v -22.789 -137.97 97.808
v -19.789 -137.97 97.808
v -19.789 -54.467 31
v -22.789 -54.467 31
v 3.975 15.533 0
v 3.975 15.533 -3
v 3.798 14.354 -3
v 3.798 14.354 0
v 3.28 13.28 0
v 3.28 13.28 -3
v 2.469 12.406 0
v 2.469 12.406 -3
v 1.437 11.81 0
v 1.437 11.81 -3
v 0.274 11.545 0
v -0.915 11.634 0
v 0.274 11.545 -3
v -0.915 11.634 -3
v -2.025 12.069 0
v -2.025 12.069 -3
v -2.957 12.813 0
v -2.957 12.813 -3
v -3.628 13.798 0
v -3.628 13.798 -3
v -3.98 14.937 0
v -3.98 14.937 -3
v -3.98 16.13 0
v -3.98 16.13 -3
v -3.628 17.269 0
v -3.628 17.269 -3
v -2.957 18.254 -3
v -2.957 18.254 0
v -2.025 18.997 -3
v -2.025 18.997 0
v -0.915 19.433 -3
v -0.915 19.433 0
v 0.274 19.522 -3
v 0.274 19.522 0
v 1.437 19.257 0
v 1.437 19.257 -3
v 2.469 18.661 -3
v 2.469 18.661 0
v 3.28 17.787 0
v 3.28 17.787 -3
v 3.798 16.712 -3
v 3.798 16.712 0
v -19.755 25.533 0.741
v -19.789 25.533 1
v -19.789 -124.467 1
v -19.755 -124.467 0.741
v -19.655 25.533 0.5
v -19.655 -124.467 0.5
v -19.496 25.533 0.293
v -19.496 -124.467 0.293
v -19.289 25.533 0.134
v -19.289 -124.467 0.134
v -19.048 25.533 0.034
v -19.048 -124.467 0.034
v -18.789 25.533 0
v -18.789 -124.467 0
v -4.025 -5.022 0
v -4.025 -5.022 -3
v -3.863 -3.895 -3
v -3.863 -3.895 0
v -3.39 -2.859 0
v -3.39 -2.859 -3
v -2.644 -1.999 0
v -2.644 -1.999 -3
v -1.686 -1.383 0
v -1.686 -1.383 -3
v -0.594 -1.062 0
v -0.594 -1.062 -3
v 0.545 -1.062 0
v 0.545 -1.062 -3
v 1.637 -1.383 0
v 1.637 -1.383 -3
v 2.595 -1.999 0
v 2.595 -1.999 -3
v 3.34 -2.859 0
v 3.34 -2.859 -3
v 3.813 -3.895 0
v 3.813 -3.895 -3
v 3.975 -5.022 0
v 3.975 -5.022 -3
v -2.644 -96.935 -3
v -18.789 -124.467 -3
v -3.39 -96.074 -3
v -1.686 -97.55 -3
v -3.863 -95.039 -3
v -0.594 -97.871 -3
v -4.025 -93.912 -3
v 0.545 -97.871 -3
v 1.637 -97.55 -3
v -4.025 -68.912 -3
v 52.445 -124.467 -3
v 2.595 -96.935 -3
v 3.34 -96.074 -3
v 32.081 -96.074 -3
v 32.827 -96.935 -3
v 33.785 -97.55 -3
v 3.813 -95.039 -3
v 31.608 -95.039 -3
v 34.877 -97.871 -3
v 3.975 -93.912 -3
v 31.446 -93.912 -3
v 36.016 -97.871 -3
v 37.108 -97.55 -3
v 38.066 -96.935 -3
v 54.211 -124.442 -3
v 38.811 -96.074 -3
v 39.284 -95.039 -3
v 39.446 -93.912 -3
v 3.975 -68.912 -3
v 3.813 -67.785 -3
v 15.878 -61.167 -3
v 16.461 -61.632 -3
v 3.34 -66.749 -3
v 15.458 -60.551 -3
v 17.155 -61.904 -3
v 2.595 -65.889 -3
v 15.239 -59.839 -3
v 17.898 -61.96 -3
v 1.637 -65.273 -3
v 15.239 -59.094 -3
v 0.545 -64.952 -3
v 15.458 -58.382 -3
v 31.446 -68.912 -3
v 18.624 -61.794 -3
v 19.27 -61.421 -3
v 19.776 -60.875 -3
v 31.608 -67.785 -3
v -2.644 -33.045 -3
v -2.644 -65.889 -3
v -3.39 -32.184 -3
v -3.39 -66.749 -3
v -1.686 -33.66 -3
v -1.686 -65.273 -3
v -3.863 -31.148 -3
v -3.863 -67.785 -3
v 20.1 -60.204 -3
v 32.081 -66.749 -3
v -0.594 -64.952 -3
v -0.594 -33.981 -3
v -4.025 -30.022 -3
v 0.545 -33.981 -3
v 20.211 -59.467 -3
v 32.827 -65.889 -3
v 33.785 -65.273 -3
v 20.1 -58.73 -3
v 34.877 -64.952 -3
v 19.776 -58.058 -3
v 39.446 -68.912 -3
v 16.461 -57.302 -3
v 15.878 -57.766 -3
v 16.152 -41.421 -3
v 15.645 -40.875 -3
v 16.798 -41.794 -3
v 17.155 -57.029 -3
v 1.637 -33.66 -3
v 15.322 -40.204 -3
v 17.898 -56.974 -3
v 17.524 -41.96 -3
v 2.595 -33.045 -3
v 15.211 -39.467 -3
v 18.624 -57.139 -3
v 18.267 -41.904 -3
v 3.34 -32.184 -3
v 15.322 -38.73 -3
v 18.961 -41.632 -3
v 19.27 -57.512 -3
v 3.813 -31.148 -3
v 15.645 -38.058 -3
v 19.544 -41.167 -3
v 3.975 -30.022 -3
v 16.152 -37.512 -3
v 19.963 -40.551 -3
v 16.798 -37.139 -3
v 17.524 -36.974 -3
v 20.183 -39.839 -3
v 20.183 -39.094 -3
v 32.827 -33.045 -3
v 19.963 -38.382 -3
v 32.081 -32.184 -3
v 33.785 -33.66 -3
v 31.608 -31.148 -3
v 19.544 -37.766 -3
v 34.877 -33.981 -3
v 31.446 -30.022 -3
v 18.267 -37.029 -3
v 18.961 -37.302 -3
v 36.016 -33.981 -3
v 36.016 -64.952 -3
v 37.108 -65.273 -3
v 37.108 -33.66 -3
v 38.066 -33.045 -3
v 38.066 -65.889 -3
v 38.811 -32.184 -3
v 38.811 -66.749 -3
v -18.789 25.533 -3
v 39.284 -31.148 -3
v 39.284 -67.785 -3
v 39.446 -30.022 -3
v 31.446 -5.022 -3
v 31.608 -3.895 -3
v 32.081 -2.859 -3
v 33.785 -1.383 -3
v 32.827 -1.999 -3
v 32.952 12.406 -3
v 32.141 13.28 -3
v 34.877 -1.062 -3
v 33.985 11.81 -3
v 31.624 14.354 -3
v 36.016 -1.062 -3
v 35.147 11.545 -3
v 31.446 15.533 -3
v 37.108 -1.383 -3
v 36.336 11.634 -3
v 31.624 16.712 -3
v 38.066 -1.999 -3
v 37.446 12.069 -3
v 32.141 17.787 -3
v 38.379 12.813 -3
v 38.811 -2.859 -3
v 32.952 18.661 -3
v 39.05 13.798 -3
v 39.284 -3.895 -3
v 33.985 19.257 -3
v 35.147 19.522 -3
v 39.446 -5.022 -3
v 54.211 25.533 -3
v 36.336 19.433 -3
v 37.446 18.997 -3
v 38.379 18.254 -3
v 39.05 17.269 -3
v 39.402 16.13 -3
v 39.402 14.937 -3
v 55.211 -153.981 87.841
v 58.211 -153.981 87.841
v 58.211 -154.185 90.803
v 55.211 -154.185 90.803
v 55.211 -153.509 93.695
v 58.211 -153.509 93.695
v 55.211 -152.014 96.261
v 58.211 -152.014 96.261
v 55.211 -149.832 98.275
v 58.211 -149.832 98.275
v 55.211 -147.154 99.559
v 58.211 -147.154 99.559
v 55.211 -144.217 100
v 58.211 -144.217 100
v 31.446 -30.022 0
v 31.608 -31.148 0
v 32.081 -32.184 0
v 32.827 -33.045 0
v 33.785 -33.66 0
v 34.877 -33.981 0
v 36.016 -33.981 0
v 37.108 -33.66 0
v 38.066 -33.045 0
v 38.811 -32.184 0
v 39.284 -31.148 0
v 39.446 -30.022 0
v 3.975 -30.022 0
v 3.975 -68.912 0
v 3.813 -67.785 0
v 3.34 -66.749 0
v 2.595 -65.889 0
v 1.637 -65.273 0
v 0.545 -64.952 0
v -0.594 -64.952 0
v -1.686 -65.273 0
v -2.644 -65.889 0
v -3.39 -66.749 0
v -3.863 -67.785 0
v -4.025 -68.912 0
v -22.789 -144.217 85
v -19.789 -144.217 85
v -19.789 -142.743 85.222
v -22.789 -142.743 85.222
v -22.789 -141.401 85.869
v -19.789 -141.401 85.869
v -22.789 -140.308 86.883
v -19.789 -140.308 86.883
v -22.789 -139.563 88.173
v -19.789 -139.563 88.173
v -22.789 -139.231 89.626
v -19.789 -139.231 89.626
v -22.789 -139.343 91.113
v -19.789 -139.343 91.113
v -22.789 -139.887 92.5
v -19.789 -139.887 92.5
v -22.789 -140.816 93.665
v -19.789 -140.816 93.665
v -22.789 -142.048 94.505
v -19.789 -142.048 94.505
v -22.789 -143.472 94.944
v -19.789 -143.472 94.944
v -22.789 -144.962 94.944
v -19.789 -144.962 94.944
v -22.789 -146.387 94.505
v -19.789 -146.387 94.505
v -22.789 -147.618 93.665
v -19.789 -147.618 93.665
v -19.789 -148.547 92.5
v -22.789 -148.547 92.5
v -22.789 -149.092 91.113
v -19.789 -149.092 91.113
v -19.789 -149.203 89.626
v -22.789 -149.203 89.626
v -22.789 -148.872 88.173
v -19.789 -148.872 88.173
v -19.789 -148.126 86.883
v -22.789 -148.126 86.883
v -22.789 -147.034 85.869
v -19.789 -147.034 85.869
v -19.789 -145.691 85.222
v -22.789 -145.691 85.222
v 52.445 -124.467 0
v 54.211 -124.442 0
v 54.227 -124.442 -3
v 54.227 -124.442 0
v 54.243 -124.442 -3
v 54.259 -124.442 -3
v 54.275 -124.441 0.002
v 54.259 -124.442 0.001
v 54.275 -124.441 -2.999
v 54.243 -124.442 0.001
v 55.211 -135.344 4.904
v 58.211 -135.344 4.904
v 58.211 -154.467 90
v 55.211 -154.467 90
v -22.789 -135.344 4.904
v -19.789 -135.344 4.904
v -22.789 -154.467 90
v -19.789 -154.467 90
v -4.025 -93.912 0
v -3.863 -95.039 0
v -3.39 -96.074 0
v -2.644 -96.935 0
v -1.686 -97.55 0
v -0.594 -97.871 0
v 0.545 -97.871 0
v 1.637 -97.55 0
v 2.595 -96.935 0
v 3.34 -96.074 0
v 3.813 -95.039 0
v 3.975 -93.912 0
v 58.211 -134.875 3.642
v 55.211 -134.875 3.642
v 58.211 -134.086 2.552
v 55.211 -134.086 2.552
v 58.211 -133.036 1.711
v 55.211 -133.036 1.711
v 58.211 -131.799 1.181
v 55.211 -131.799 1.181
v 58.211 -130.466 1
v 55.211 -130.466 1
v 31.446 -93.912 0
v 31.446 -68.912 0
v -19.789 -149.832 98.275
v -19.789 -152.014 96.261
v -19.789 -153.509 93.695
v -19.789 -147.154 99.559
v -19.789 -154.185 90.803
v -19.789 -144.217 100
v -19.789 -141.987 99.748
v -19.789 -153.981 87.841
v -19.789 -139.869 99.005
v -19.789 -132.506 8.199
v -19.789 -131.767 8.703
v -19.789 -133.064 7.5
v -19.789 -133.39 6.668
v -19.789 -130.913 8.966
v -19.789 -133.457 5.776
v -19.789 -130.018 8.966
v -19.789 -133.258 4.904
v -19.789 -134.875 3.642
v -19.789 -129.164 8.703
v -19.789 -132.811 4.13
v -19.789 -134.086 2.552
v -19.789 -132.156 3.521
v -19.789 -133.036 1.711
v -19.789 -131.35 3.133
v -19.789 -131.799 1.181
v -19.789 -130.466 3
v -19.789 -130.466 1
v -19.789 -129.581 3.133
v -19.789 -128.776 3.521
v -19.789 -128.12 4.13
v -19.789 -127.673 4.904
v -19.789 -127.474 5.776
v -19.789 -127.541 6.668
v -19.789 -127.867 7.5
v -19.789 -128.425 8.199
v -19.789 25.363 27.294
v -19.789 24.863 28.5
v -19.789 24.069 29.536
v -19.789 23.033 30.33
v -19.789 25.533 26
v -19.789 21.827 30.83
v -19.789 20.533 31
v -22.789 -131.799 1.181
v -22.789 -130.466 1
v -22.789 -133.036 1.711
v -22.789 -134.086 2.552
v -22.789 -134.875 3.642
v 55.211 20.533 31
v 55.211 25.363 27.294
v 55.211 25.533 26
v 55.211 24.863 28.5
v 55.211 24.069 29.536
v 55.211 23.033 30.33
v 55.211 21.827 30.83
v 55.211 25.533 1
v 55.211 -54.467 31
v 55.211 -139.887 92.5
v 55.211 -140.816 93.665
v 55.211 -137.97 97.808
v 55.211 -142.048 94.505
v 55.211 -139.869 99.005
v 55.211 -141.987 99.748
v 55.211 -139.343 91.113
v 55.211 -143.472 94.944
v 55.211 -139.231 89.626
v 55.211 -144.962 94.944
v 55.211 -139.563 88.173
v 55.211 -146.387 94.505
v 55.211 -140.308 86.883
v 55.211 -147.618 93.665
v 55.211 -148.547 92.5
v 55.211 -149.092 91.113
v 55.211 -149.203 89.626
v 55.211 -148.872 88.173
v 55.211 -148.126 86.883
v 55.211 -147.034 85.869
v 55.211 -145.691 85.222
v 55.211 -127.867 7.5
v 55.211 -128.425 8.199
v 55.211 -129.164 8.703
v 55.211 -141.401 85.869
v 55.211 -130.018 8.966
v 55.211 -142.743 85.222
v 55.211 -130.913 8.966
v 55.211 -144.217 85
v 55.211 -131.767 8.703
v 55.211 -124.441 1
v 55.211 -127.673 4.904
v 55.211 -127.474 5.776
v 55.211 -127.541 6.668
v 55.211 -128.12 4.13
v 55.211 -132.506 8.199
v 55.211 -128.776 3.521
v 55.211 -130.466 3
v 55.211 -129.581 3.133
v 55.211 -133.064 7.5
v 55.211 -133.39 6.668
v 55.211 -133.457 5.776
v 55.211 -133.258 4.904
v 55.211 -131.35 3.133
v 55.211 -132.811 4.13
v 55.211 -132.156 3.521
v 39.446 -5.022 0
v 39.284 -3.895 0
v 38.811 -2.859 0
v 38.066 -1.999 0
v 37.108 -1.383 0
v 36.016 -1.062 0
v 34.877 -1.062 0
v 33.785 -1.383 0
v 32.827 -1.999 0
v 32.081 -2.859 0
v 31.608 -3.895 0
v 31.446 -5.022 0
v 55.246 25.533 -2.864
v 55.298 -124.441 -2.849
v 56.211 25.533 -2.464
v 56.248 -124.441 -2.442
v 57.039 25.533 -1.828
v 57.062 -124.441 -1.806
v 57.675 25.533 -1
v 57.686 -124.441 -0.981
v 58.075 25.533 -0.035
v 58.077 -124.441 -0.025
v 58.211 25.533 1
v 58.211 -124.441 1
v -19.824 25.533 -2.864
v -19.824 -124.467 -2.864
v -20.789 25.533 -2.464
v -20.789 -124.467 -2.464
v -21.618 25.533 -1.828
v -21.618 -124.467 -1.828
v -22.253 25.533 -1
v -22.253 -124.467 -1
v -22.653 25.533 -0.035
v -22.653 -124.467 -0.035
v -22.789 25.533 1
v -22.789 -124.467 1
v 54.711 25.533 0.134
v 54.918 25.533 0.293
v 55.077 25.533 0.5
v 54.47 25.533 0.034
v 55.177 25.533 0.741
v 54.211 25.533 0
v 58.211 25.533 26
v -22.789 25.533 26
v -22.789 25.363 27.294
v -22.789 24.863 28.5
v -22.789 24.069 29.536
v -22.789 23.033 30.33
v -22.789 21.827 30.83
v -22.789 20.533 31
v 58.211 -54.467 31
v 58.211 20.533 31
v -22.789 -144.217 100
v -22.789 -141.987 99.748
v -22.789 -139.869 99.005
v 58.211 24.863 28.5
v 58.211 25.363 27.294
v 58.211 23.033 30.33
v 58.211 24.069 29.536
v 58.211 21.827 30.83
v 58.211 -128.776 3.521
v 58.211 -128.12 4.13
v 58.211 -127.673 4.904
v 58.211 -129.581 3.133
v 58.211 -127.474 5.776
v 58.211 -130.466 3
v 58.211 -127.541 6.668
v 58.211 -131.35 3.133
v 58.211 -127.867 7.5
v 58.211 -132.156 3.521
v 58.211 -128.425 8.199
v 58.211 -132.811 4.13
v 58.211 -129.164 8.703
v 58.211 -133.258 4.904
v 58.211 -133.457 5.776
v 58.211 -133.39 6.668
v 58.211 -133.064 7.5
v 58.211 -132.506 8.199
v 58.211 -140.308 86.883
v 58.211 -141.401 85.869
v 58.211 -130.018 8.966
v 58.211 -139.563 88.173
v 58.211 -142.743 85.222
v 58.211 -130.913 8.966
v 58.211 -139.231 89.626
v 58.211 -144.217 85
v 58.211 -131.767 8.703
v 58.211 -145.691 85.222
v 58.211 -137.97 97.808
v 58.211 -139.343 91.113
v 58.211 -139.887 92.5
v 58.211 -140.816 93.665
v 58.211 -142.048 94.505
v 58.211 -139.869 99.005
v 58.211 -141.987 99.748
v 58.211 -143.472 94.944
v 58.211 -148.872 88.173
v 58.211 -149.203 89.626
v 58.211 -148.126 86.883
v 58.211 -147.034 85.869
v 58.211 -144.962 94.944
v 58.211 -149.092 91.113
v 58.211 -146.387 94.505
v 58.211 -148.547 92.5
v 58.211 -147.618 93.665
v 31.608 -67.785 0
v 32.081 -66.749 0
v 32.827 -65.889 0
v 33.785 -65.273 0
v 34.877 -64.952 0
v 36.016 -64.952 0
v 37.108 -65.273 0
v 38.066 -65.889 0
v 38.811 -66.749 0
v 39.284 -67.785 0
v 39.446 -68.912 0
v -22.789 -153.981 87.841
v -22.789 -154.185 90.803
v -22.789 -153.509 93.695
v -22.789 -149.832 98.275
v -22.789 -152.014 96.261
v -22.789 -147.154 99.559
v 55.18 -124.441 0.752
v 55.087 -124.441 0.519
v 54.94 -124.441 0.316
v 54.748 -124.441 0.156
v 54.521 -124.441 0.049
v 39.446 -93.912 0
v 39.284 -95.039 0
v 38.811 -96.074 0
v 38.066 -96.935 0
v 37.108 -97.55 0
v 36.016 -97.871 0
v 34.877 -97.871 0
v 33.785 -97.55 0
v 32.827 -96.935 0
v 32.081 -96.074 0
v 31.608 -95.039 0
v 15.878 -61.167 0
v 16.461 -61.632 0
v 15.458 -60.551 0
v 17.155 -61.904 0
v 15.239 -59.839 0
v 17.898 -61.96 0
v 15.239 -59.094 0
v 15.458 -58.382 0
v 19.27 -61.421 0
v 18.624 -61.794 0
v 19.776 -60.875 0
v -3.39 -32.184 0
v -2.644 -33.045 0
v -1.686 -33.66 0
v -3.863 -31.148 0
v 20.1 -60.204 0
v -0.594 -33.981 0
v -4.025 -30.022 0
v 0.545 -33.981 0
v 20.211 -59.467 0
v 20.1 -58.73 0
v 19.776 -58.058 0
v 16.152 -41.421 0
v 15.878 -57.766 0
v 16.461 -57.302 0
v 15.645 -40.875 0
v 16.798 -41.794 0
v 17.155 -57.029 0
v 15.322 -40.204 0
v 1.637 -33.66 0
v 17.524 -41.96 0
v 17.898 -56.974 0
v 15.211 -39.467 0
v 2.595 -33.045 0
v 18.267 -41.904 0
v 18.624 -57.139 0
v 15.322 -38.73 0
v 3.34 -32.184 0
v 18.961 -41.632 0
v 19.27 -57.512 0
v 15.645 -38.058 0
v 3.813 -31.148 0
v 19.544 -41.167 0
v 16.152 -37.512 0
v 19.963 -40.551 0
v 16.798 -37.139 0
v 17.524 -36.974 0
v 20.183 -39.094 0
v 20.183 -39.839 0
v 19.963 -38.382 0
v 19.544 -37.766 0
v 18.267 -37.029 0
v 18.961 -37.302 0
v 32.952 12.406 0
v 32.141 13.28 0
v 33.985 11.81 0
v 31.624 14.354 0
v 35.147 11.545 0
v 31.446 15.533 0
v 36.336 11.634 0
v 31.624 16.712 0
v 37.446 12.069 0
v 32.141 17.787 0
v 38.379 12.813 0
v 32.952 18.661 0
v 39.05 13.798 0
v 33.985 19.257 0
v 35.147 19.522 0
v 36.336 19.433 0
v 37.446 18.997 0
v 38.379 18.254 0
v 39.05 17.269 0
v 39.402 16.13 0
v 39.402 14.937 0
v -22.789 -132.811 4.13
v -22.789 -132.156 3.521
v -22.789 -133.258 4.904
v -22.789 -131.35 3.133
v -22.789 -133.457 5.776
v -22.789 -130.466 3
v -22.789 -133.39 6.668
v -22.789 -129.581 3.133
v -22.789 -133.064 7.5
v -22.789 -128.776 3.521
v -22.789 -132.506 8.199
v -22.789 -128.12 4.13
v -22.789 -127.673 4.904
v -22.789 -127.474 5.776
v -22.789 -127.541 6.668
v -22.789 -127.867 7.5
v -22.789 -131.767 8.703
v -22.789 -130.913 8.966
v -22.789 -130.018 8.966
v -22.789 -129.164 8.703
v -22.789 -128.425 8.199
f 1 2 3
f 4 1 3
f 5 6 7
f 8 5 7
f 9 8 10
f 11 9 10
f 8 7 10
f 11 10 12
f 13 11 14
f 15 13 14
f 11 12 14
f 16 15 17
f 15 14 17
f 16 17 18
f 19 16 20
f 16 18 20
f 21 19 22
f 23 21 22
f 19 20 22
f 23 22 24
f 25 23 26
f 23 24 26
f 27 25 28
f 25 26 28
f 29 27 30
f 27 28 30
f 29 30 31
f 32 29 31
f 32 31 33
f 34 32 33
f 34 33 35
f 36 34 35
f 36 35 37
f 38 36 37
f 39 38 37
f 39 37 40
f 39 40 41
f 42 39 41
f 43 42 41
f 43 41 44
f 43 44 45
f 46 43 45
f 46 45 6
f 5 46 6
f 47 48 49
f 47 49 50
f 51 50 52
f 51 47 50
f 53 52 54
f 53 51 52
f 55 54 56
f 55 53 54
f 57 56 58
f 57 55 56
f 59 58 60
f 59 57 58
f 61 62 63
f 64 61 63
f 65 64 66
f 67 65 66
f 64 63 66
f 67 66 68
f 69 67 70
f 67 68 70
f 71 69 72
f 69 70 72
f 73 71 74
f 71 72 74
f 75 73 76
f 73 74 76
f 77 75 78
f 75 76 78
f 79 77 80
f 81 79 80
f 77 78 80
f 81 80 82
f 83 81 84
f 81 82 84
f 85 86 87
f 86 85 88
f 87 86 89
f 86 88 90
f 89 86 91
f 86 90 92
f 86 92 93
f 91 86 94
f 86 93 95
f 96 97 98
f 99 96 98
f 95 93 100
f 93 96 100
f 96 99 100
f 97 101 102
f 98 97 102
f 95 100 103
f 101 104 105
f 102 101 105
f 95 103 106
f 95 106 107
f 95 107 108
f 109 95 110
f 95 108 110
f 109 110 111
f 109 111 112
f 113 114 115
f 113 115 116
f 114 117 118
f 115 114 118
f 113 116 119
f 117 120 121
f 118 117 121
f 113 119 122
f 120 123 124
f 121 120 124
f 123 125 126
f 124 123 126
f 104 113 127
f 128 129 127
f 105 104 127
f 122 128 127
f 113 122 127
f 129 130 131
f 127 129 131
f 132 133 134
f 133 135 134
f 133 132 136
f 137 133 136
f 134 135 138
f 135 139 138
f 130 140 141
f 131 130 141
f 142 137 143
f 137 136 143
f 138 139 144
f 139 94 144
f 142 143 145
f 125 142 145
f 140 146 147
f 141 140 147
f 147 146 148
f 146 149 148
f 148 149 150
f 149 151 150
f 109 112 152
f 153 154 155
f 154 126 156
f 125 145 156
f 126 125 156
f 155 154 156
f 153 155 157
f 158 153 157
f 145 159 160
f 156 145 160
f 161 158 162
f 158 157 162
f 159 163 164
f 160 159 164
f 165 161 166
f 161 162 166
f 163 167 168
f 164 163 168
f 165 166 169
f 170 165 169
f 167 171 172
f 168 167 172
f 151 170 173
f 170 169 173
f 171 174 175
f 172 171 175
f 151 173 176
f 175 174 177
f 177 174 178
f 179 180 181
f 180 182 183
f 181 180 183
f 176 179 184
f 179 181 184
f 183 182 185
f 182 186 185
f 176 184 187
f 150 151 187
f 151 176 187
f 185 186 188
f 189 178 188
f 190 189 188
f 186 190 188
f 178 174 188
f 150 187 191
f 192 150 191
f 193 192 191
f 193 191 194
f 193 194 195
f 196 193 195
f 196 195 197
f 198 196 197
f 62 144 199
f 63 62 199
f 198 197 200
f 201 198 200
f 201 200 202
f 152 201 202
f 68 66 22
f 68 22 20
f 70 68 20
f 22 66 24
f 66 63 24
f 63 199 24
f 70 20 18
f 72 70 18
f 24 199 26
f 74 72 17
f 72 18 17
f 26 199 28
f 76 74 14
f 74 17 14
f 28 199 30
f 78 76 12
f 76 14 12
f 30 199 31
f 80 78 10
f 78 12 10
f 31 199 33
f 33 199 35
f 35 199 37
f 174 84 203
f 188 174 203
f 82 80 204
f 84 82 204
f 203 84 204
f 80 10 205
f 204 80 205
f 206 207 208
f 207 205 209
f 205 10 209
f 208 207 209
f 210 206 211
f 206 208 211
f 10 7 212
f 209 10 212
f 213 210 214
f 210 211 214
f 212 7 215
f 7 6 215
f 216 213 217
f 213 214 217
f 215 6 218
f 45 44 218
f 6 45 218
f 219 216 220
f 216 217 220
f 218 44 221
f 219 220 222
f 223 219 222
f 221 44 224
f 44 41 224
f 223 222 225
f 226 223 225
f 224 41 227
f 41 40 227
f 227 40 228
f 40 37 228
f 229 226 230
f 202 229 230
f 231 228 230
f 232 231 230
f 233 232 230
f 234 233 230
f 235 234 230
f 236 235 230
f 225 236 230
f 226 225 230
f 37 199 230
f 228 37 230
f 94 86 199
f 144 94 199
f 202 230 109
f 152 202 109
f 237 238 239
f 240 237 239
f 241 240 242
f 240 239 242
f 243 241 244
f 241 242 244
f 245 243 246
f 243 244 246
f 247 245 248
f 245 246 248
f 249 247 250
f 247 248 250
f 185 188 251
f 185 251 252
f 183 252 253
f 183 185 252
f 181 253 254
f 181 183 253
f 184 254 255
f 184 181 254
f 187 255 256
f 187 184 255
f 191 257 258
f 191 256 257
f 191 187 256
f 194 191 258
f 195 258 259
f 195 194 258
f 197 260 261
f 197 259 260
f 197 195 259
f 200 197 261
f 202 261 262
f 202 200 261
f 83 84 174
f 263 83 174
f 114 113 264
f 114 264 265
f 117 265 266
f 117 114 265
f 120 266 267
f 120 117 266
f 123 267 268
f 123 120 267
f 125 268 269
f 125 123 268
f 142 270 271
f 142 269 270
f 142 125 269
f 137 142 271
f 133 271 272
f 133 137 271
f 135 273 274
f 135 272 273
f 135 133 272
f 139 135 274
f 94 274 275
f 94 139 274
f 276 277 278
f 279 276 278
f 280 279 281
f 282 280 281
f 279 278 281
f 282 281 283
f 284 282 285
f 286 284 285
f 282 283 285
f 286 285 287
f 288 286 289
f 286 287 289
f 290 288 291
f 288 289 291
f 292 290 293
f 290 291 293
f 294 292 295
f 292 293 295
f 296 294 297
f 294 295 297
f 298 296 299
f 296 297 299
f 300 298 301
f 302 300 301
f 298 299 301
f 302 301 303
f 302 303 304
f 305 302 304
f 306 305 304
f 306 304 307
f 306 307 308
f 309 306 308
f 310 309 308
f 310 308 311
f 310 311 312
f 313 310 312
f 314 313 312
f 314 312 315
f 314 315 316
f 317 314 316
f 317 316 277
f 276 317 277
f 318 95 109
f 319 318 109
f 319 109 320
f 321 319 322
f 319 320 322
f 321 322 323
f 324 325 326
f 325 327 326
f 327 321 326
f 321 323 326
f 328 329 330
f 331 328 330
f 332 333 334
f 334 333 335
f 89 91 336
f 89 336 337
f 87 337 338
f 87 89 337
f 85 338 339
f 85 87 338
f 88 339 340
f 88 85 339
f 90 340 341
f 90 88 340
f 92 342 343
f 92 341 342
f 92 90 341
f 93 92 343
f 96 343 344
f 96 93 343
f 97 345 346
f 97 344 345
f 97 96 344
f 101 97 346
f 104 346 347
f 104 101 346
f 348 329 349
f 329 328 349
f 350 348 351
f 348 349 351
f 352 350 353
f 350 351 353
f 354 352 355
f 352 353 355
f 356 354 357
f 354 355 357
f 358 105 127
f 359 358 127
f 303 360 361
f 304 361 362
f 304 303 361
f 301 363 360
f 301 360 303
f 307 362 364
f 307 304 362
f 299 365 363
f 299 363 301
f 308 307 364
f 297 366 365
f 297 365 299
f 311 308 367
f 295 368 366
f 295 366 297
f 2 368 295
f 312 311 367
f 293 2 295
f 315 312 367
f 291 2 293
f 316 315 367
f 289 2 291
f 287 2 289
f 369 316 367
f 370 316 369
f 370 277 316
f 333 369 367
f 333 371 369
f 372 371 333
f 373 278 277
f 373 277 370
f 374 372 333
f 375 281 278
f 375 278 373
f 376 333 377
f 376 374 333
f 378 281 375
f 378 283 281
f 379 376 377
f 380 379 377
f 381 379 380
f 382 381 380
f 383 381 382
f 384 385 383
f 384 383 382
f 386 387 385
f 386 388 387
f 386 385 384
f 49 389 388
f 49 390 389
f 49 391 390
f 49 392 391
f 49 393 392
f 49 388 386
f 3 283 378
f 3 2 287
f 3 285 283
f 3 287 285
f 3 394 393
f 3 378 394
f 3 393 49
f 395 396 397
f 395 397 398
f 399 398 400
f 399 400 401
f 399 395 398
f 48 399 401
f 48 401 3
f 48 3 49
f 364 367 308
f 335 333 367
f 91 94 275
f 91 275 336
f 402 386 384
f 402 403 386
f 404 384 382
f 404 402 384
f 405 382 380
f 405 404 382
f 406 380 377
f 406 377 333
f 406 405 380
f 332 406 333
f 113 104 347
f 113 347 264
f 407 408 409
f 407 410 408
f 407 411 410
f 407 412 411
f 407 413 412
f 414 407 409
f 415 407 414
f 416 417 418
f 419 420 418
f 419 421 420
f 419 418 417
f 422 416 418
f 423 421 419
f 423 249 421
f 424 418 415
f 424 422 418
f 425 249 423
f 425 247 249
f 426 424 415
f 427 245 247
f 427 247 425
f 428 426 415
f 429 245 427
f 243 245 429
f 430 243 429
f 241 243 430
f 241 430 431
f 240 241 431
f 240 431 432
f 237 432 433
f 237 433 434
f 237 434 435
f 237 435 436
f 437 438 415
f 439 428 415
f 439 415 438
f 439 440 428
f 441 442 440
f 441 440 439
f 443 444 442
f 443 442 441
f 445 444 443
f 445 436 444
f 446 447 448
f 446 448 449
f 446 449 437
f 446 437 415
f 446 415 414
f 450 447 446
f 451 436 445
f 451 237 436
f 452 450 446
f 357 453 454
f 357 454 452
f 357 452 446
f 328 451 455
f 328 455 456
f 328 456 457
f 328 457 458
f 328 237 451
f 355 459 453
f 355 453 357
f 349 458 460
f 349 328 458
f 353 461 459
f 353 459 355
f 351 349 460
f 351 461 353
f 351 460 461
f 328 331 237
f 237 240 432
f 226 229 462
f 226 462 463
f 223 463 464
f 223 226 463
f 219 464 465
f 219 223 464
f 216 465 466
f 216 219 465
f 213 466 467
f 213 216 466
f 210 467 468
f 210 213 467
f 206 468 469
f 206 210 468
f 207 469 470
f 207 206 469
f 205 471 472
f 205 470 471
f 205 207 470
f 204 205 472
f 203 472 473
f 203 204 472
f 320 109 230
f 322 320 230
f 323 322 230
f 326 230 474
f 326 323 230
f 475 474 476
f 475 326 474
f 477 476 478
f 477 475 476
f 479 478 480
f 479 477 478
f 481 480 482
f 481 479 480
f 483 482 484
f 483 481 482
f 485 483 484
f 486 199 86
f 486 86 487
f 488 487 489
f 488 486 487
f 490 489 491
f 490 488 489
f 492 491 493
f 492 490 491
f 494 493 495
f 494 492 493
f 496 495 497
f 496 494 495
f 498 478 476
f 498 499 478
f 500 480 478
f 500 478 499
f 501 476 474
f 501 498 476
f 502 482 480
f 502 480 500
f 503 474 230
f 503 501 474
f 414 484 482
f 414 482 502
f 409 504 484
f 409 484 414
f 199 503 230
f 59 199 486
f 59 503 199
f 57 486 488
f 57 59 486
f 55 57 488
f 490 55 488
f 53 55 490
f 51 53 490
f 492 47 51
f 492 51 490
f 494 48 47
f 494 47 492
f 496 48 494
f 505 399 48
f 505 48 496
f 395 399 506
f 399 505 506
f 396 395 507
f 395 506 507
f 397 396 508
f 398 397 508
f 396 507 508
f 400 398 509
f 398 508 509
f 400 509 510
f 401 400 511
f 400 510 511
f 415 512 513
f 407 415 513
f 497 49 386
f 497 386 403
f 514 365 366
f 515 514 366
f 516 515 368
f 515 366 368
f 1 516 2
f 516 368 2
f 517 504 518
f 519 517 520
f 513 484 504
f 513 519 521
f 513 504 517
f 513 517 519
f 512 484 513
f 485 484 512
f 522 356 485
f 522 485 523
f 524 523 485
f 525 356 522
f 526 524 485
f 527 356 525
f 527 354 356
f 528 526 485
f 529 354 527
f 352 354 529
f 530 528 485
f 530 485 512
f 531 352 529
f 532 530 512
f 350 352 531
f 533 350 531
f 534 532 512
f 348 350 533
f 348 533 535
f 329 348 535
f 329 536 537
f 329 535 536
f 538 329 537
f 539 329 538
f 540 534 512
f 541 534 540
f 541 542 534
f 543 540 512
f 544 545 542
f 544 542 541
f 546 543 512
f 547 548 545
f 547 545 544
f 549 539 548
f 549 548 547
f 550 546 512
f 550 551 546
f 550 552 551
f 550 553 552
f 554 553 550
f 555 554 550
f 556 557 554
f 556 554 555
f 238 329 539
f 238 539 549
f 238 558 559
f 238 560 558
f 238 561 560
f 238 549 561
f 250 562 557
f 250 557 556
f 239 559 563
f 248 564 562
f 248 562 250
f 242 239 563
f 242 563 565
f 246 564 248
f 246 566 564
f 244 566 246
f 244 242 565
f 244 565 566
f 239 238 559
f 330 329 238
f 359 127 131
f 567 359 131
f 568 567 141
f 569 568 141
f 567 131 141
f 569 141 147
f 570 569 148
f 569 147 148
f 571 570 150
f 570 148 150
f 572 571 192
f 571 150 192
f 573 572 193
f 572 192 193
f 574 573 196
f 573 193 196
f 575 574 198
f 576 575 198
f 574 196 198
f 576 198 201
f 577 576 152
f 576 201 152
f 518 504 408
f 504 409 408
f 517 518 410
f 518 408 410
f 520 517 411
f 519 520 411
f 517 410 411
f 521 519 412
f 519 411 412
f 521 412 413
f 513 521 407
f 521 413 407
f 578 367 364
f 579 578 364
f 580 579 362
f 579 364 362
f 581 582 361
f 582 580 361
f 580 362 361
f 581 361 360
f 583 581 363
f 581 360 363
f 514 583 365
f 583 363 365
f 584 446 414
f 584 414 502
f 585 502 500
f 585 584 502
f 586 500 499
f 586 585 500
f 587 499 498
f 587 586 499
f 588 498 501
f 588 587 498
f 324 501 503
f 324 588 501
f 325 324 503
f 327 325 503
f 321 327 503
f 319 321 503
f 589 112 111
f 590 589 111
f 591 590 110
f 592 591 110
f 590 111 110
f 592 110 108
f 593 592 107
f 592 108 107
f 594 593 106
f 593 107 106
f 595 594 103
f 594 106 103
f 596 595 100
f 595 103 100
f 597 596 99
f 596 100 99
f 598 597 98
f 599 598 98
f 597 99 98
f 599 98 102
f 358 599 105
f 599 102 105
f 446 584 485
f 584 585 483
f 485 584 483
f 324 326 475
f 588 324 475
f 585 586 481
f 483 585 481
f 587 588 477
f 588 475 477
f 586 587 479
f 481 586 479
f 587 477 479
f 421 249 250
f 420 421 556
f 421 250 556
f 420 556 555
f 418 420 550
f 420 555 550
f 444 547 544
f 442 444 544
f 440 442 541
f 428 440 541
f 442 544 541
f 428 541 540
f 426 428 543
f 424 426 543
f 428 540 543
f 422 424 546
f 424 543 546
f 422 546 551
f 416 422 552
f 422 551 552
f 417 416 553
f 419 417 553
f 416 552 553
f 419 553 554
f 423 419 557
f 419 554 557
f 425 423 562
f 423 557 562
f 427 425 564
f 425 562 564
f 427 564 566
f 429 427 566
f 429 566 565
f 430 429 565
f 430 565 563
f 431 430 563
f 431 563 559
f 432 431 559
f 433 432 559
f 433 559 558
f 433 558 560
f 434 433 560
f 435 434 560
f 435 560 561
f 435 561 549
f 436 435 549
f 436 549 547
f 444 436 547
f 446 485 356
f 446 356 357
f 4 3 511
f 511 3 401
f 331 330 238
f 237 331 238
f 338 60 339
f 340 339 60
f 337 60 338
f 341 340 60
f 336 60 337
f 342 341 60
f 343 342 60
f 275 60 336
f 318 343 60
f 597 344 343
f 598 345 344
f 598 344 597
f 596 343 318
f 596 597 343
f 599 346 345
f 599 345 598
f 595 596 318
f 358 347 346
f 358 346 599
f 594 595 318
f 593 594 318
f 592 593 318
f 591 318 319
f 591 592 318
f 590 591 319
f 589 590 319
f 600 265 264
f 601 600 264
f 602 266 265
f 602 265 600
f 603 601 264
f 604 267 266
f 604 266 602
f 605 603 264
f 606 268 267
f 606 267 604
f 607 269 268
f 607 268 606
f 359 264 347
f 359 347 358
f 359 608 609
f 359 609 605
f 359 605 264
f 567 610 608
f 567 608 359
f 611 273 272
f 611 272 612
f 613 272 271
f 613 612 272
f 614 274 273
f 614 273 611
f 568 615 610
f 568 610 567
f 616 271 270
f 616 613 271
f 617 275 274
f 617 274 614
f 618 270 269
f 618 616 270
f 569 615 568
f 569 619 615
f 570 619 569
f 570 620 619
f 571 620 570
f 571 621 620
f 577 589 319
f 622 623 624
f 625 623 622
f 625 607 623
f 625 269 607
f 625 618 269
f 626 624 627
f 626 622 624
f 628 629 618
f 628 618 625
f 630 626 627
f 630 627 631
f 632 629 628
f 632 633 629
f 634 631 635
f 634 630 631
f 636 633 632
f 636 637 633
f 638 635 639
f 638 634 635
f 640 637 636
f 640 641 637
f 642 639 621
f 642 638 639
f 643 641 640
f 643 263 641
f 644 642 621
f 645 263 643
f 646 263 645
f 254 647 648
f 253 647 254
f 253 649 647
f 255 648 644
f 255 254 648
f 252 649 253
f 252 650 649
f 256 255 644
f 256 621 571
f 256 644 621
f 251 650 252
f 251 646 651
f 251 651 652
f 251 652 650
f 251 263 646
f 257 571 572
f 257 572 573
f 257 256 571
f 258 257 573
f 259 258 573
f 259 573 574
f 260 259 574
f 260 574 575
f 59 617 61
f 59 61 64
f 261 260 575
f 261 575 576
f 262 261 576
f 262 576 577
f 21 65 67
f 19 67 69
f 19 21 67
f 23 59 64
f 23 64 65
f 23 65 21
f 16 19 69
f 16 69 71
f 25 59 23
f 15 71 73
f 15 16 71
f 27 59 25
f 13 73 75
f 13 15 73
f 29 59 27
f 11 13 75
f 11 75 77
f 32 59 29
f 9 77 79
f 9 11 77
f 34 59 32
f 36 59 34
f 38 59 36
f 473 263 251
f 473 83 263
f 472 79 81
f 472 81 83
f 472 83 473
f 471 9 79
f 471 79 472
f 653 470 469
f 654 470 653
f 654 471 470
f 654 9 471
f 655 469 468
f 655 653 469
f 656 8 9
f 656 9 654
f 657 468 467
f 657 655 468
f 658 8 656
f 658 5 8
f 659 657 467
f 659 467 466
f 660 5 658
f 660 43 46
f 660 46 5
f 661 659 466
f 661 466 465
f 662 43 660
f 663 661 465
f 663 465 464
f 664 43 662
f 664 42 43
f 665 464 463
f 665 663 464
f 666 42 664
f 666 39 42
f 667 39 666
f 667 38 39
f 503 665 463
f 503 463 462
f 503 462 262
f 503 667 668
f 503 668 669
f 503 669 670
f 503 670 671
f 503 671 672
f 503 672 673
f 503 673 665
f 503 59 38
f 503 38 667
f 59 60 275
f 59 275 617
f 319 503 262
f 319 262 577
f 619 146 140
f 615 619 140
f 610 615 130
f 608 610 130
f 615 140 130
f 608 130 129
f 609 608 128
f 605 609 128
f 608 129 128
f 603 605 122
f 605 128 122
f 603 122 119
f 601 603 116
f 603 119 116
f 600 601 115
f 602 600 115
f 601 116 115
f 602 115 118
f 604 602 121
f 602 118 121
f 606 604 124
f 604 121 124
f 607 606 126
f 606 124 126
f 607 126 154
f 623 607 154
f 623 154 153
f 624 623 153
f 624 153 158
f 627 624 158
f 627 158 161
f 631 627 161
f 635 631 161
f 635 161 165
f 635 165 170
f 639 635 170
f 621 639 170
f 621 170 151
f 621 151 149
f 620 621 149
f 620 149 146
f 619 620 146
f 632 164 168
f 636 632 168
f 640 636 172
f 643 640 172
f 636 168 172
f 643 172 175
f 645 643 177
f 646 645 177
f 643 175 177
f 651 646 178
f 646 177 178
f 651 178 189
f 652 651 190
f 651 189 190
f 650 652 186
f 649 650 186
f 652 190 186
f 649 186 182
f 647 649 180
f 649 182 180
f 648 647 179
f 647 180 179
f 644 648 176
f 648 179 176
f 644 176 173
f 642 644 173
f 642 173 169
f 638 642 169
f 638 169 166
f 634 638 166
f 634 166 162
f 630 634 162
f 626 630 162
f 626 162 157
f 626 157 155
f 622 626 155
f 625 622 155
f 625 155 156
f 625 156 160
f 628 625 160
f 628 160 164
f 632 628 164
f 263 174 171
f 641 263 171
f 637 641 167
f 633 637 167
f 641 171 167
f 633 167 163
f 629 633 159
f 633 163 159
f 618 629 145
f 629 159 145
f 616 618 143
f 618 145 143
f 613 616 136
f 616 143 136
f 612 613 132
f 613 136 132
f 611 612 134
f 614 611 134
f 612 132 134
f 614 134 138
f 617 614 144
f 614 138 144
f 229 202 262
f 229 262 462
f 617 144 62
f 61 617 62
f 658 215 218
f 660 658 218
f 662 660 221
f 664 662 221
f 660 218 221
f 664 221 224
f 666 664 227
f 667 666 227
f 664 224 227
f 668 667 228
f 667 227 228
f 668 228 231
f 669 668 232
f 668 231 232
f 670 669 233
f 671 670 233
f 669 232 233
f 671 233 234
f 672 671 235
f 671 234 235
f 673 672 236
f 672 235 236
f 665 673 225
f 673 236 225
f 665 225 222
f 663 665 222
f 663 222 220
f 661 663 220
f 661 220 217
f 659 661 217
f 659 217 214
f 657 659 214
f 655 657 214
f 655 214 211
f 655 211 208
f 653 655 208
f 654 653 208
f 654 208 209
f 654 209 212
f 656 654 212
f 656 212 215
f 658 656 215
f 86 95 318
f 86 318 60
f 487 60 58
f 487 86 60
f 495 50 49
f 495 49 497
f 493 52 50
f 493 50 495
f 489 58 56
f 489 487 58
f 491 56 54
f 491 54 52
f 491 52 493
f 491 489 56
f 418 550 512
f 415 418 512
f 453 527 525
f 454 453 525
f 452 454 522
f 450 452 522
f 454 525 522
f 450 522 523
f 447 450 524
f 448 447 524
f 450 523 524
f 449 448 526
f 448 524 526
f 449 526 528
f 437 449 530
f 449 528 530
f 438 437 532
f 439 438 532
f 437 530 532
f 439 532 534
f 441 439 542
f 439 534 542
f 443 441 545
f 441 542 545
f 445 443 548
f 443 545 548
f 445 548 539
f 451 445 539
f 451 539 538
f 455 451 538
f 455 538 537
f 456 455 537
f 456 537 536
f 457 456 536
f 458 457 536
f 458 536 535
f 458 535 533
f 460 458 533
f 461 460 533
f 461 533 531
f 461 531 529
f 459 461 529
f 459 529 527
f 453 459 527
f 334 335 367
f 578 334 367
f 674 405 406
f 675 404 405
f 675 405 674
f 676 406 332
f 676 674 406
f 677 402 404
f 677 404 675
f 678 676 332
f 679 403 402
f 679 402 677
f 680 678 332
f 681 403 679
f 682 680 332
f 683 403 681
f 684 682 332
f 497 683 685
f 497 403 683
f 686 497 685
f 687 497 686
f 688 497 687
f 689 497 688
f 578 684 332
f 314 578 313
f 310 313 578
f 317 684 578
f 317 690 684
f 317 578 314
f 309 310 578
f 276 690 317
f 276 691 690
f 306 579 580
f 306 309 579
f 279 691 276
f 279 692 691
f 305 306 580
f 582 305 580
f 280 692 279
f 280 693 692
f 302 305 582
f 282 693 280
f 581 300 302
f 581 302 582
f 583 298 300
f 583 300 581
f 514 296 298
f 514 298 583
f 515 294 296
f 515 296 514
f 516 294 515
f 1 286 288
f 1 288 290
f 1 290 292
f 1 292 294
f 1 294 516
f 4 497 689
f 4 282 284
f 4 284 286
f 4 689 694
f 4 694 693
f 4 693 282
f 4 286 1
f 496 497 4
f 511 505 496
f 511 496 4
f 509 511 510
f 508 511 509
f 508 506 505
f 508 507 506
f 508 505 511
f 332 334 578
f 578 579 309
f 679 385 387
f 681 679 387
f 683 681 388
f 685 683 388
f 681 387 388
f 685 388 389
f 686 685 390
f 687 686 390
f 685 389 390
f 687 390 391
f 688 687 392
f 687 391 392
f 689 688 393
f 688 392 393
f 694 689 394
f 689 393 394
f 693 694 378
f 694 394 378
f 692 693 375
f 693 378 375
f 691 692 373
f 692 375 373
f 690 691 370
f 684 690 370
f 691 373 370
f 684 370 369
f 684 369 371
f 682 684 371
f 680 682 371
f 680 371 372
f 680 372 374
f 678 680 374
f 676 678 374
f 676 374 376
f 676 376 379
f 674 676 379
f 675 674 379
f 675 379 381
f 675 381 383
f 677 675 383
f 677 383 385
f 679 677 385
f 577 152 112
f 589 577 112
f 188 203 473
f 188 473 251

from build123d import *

# Parameters (mm, degrees)
SKETCH_1_W                       = 75
SKETCH_1_H                       = 180
SM_BASE_FLANGE_1_DEPTH           = 3
SM_EDGE_FLANGE_1_STRIP_W         = 14
SM_EDGE_FLANGE_1_STRIP_H         = 3
SM_EDGE_FLANGE_1_STRIP_CUT_DEPTH = 180
SM_EDGE_FLANGE_1_DEPTH           = 180
SM_EDGE_FLANGE_2_STRIP_W         = 14
SM_EDGE_FLANGE_2_STRIP_H         = 3
SM_EDGE_FLANGE_2_STRIP_CUT_DEPTH = 180
SM_EDGE_FLANGE_2_DEPTH           = 180
CUT_EXTRUDE_12_DEPTH             = 305
CUT_EXTRUDE_13_DEPTH             = 100
SKETCH_18_R                      = 5
CUT_EXTRUDE_14_DEPTH             = 100
CUT_EXTRUDE_16_DEPTH             = 100
SKETCH_21_W                      = 73
SKETCH_21_H                      = 30
CUT_EXTRUDE_17_DEPTH             = 100
CUT_EXTRUDE_18_DEPTH             = 4
CUT_EXTRUDE_START                = -4
CUT_EXTRUDE_19_DEPTH             = 4
SKETCH_24_R                      = 4
SKETCH_24_R_2                    = 2.5
CUT_EXTRUDE_20_DEPTH             = 195.569908194
CUT_EXTRUDE_23_DEPTH             = 4
SKETCH_26_W                      = 5.11266932
SKETCH_26_H                      = 10
CUT_EXTRUDE_24_DEPTH             = 4
FILLET_1_R                       = 5
FILLET_2_R                       = 5
FILLET_3_R                       = 5
FILLET_4_R                       = 5
SKETCH_27_R                      = 3
CUT_EXTRUDE_25_DEPTH             = 202.049602951


# Read off the part's stored shape, not the designer's step: 切除-拉伸19
# Sheet-metal steps are written as plain solids
with BuildPart() as part:
    # Sketch 1 → 基体-法兰1 (new body)
    with BuildSketch(Plane.XY):
        with Locations((17.710878089, -64.466639915)):
            Rectangle(SKETCH_1_W, SKETCH_1_H)
    extrude(amount=-SM_BASE_FLANGE_1_DEPTH)

    # 边线-法兰1 strip (across the edge) → 边线-法兰1 strip cut (cut)
    with BuildSketch(Plane(origin=(55.210878089, -154.466639915, 0), x_dir=(-1, 0, 0), z_dir=(0, 1, 0))):
        with Locations((-6, -1.5)):
            Rectangle(SM_EDGE_FLANGE_1_STRIP_W, SM_EDGE_FLANGE_1_STRIP_H)
    extrude(amount=SM_EDGE_FLANGE_1_STRIP_CUT_DEPTH, mode=Mode.SUBTRACT)

    # 边线-法兰1 section (across the edge) → 边线-法兰1 (add)
    with BuildSketch(Plane(origin=(55.210878089, -154.466639915, 0), x_dir=(-1, 0, 0), z_dir=(0, 1, 0))):
        with BuildLine():
            Line((-3, 1), (-3, 100))
            Line((-3, 100), (0, 100))
            Line((0, 100), (0, 1))
            ThreePointArc((0, 1), (0.292893219, 0.292893219), (1, 0))
            Line((1, 0), (1, -3))
            ThreePointArc((1, -3), (-1.828427125, -1.828427125), (-3, 1))
        make_face()
    extrude(amount=SM_EDGE_FLANGE_1_DEPTH)

    # 边线-法兰2 strip (across the edge) → 边线-法兰2 strip cut (cut)
    with BuildSketch(Plane(origin=(-19.789121911, 25.533360085, 0), x_dir=(1, 0, 0), z_dir=(0, -1, 0))):
        with Locations((-6, -1.5)):
            Rectangle(SM_EDGE_FLANGE_2_STRIP_W, SM_EDGE_FLANGE_2_STRIP_H)
    extrude(amount=SM_EDGE_FLANGE_2_STRIP_CUT_DEPTH, mode=Mode.SUBTRACT)

    # 边线-法兰2 section (across the edge) → 边线-法兰2 (add)
    with BuildSketch(Plane(origin=(-19.789121911, 25.533360085, 0), x_dir=(1, 0, 0), z_dir=(0, -1, 0))):
        with BuildLine():
            Line((-3, 1), (-3, 100))
            Line((-3, 100), (0, 100))
            Line((0, 100), (0, 1))
            ThreePointArc((0, 1), (0.292893219, 0.292893219), (1, 0))
            Line((1, 0), (1, -3))
            ThreePointArc((1, -3), (-1.828427125, -1.828427125), (-3, 1))
        make_face()
    extrude(amount=SM_EDGE_FLANGE_2_DEPTH)

    # 草图15 → 切除-拉伸12 (cut)
    with BuildSketch(Plane(origin=(58.210878089, 0, 0), x_dir=(0, 0, -1), z_dir=(1, 0, 0))):
        Polygon((-1, -154.466639915), (-1, -134.466639915), (-90, -154.466639915), align=None)
    extrude(amount=-CUT_EXTRUDE_12_DEPTH, mode=Mode.SUBTRACT)

    # 草图17 → 切除-拉伸13 (cut)
    with BuildSketch(Plane(origin=(58.210878089, 0, 0), x_dir=(0, 0, -1), z_dir=(1, 0, 0))):
        with BuildLine():
            Line((-100, -144.217256156), (-100, -154.466639915))
            Line((-100, -154.466639915), (-90, -154.466639915))
            Line((-90, -154.466639915), (-87.840693161, -153.981343107))
            ThreePointArc((-87.840693161, -153.981343107), (-96.261267109, -152.014469389), (-100, -144.217256156))
        make_face()
    extrude(amount=-CUT_EXTRUDE_13_DEPTH, mode=Mode.SUBTRACT)

    # 草图18 → 切除-拉伸14 (cut)
    with BuildSketch(Plane(origin=(58.210878089, 0, 0), x_dir=(0, 0, -1), z_dir=(1, 0, 0))):
        with Locations((-90, -144.217256156)):
            Circle(SKETCH_18_R)
    extrude(amount=-CUT_EXTRUDE_14_DEPTH, mode=Mode.SUBTRACT)

    # 草图19 → 切除-拉伸16 (cut)
    with BuildSketch(Plane(origin=(58.210878089, 0, 0), x_dir=(0, 0, -1), z_dir=(1, 0, 0))):
        with BuildLine():
            ThreePointArc((-100, -144.217256156), (-99.436213635, -140.906988458), (-97.808425553, -137.969977518))
            Line((-97.808425553, -137.969977518), (-31, -54.466639915))
            Line((-31, -54.466639915), (-31, 25.533360085))
            Line((-31, 25.533360085), (-100, 25.533360085))
            Line((-100, 25.533360085), (-100, -144.217256156))
        make_face()
    extrude(amount=-CUT_EXTRUDE_16_DEPTH, mode=Mode.SUBTRACT)

    # 草图21 → 切除-拉伸17 (cut)
    with BuildSketch(Plane(origin=(0, 0, -3), x_dir=(-1, 0, 0), z_dir=(0, 0, -1))):
        with Locations((-17.710878089, -139.466639915)):
            Rectangle(SKETCH_21_W, SKETCH_21_H)
    extrude(amount=-CUT_EXTRUDE_17_DEPTH, mode=Mode.SUBTRACT)

    # 草图22 → 切除-拉伸18 (cut)
    with BuildSketch(Plane(origin=(0, 0, -3), x_dir=(-1, 0, 0), z_dir=(0, 0, -1))):
        Polygon((-59.141267928, -134.466639915), (-53.468887504, -134.466639915), (-53.468887504, -154.535826818), (-59.141267928, -156.162456052), align=None)
    extrude(amount=-CUT_EXTRUDE_18_DEPTH, mode=Mode.SUBTRACT)

    # 切除-拉伸19 outline → 切除-拉伸19 (cut)
    with BuildSketch(Plane(origin=(-18.789121911, 0, 0), x_dir=(0, 0, -1), z_dir=(1, 0, 0)).offset(CUT_EXTRUDE_START)):
        Polygon((3, -154.466639915), (4.115118774, -134.466639915), (-1, -134.466639915), (-1, -154.466639915), align=None)
    extrude(amount=CUT_EXTRUDE_19_DEPTH, mode=Mode.SUBTRACT)

    # 草图24 → 切除-拉伸20 (cut, through all)
    with BuildSketch(Plane(origin=(0, 0, -3), x_dir=(-1, 0, 0), z_dir=(0, 0, -1))):
        with Locations((-35.446317978, 15.533360085)):
            Circle(SKETCH_24_R)
        with Locations(Location((0.0245618, 15.533360085, 0), (0, 0, 180))):
            Circle(SKETCH_24_R)
        with Locations((-17.710878089, -39.466639915)):
            Circle(SKETCH_24_R_2)
        with Locations(Location((-17.710878089, -59.466639915, 0), (0, 0, 180))):
            Circle(SKETCH_24_R_2)
        with BuildLine():
            Line((-31.446317978, -5.021559832), (-31.446317978, -30.021559832))
            ThreePointArc((-31.446317978, -30.021559832), (-35.446317978, -34.021559832), (-39.446317978, -30.021559832))
            Line((-39.446317978, -30.021559832), (-39.446317978, -5.021559832))
            ThreePointArc((-39.446317978, -5.021559832), (-35.446317978, -1.021559832), (-31.446317978, -5.021559832))
        make_face()
        with BuildLine():
            Line((-3.9754382, -5.021559832), (-3.9754382, -30.021559832))
            ThreePointArc((-3.9754382, -30.021559832), (0.0245618, -34.021559832), (4.0245618, -30.021559832))
            Line((4.0245618, -30.021559832), (4.0245618, -5.021559832))
            ThreePointArc((4.0245618, -5.021559832), (0.0245618, -1.021559832), (-3.9754382, -5.021559832))
        make_face()
        with BuildLine():
            Line((-31.446317978, -93.911719998), (-31.446317978, -68.911719998))
            ThreePointArc((-31.446317978, -68.911719998), (-35.446317978, -64.911719998), (-39.446317978, -68.911719998))
            Line((-39.446317978, -68.911719998), (-39.446317978, -93.911719998))
            ThreePointArc((-39.446317978, -93.911719998), (-35.446317978, -97.911719998), (-31.446317978, -93.911719998))
        make_face()
        with BuildLine():
            Line((-3.9754382, -93.911719998), (-3.9754382, -68.911719998))
            ThreePointArc((-3.9754382, -68.911719998), (0.0245618, -64.911719998), (4.0245618, -68.911719998))
            Line((4.0245618, -68.911719998), (4.0245618, -93.911719998))
            ThreePointArc((4.0245618, -93.911719998), (0.0245618, -97.911719998), (-3.9754382, -93.911719998))
        make_face()
    extrude(amount=-CUT_EXTRUDE_20_DEPTH, mode=Mode.SUBTRACT)

    # 草图25 → 切除-拉伸23 (cut)
    with BuildSketch(Plane(origin=(0, 0, -3), x_dir=(-1, 0, 0), z_dir=(0, 0, -1))):
        Polygon((-54.27524735, -124.441494169), (-58.427773386, -124.441494169), (-58.210878089, -134.466639915), (-55.210878089, -134.466639915), (-54.27524735, -134.466639915), (-52.445155018, -134.466639915), (-52.445155018, -124.466639915), align=None)
    extrude(amount=-CUT_EXTRUDE_23_DEPTH, mode=Mode.SUBTRACT)

    # 草图26 → 切除-拉伸24 (cut)
    with BuildSketch(Plane(origin=(0, 0, -3), x_dir=(-1, 0, 0), z_dir=(0, 0, -1))):
        with Locations((21.345456571, -129.466639915)):
            Rectangle(SKETCH_26_W, SKETCH_26_H)
    extrude(amount=-CUT_EXTRUDE_24_DEPTH, mode=Mode.SUBTRACT)

    # 圆角1
    fillet_1_edges = [part.edges().sort_by_distance(p)[0] for p in [
        (56.710878089, -134.466639915, 1),
    ]]
    fillet(fillet_1_edges, radius=FILLET_1_R)

    # 圆角2
    fillet_2_edges = [part.edges().sort_by_distance(p)[0] for p in [
        (-21.289121911, -134.466639915, 1),
    ]]
    fillet(fillet_2_edges, radius=FILLET_2_R)

    # 圆角3
    fillet_3_edges = [part.edges().sort_by_distance(p)[0] for p in [
        (56.710878089, 25.533360085, 31),
    ]]
    fillet(fillet_3_edges, radius=FILLET_3_R)

    # 圆角4
    fillet_4_edges = [part.edges().sort_by_distance(p)[0] for p in [
        (-21.289121911, 25.533360085, 31),
    ]]
    fillet(fillet_4_edges, radius=FILLET_4_R)

    # 草图27 → 切除-拉伸25 (cut, through all)
    with BuildSketch(Plane(origin=(58.210878089, 0, 0), x_dir=(0, 0, -1), z_dir=(1, 0, 0))):
        with Locations((-6, -130.465543541)):
            Circle(SKETCH_27_R)
    extrude(amount=-CUT_EXTRUDE_25_DEPTH, mode=Mode.SUBTRACT)


solid = part.part
